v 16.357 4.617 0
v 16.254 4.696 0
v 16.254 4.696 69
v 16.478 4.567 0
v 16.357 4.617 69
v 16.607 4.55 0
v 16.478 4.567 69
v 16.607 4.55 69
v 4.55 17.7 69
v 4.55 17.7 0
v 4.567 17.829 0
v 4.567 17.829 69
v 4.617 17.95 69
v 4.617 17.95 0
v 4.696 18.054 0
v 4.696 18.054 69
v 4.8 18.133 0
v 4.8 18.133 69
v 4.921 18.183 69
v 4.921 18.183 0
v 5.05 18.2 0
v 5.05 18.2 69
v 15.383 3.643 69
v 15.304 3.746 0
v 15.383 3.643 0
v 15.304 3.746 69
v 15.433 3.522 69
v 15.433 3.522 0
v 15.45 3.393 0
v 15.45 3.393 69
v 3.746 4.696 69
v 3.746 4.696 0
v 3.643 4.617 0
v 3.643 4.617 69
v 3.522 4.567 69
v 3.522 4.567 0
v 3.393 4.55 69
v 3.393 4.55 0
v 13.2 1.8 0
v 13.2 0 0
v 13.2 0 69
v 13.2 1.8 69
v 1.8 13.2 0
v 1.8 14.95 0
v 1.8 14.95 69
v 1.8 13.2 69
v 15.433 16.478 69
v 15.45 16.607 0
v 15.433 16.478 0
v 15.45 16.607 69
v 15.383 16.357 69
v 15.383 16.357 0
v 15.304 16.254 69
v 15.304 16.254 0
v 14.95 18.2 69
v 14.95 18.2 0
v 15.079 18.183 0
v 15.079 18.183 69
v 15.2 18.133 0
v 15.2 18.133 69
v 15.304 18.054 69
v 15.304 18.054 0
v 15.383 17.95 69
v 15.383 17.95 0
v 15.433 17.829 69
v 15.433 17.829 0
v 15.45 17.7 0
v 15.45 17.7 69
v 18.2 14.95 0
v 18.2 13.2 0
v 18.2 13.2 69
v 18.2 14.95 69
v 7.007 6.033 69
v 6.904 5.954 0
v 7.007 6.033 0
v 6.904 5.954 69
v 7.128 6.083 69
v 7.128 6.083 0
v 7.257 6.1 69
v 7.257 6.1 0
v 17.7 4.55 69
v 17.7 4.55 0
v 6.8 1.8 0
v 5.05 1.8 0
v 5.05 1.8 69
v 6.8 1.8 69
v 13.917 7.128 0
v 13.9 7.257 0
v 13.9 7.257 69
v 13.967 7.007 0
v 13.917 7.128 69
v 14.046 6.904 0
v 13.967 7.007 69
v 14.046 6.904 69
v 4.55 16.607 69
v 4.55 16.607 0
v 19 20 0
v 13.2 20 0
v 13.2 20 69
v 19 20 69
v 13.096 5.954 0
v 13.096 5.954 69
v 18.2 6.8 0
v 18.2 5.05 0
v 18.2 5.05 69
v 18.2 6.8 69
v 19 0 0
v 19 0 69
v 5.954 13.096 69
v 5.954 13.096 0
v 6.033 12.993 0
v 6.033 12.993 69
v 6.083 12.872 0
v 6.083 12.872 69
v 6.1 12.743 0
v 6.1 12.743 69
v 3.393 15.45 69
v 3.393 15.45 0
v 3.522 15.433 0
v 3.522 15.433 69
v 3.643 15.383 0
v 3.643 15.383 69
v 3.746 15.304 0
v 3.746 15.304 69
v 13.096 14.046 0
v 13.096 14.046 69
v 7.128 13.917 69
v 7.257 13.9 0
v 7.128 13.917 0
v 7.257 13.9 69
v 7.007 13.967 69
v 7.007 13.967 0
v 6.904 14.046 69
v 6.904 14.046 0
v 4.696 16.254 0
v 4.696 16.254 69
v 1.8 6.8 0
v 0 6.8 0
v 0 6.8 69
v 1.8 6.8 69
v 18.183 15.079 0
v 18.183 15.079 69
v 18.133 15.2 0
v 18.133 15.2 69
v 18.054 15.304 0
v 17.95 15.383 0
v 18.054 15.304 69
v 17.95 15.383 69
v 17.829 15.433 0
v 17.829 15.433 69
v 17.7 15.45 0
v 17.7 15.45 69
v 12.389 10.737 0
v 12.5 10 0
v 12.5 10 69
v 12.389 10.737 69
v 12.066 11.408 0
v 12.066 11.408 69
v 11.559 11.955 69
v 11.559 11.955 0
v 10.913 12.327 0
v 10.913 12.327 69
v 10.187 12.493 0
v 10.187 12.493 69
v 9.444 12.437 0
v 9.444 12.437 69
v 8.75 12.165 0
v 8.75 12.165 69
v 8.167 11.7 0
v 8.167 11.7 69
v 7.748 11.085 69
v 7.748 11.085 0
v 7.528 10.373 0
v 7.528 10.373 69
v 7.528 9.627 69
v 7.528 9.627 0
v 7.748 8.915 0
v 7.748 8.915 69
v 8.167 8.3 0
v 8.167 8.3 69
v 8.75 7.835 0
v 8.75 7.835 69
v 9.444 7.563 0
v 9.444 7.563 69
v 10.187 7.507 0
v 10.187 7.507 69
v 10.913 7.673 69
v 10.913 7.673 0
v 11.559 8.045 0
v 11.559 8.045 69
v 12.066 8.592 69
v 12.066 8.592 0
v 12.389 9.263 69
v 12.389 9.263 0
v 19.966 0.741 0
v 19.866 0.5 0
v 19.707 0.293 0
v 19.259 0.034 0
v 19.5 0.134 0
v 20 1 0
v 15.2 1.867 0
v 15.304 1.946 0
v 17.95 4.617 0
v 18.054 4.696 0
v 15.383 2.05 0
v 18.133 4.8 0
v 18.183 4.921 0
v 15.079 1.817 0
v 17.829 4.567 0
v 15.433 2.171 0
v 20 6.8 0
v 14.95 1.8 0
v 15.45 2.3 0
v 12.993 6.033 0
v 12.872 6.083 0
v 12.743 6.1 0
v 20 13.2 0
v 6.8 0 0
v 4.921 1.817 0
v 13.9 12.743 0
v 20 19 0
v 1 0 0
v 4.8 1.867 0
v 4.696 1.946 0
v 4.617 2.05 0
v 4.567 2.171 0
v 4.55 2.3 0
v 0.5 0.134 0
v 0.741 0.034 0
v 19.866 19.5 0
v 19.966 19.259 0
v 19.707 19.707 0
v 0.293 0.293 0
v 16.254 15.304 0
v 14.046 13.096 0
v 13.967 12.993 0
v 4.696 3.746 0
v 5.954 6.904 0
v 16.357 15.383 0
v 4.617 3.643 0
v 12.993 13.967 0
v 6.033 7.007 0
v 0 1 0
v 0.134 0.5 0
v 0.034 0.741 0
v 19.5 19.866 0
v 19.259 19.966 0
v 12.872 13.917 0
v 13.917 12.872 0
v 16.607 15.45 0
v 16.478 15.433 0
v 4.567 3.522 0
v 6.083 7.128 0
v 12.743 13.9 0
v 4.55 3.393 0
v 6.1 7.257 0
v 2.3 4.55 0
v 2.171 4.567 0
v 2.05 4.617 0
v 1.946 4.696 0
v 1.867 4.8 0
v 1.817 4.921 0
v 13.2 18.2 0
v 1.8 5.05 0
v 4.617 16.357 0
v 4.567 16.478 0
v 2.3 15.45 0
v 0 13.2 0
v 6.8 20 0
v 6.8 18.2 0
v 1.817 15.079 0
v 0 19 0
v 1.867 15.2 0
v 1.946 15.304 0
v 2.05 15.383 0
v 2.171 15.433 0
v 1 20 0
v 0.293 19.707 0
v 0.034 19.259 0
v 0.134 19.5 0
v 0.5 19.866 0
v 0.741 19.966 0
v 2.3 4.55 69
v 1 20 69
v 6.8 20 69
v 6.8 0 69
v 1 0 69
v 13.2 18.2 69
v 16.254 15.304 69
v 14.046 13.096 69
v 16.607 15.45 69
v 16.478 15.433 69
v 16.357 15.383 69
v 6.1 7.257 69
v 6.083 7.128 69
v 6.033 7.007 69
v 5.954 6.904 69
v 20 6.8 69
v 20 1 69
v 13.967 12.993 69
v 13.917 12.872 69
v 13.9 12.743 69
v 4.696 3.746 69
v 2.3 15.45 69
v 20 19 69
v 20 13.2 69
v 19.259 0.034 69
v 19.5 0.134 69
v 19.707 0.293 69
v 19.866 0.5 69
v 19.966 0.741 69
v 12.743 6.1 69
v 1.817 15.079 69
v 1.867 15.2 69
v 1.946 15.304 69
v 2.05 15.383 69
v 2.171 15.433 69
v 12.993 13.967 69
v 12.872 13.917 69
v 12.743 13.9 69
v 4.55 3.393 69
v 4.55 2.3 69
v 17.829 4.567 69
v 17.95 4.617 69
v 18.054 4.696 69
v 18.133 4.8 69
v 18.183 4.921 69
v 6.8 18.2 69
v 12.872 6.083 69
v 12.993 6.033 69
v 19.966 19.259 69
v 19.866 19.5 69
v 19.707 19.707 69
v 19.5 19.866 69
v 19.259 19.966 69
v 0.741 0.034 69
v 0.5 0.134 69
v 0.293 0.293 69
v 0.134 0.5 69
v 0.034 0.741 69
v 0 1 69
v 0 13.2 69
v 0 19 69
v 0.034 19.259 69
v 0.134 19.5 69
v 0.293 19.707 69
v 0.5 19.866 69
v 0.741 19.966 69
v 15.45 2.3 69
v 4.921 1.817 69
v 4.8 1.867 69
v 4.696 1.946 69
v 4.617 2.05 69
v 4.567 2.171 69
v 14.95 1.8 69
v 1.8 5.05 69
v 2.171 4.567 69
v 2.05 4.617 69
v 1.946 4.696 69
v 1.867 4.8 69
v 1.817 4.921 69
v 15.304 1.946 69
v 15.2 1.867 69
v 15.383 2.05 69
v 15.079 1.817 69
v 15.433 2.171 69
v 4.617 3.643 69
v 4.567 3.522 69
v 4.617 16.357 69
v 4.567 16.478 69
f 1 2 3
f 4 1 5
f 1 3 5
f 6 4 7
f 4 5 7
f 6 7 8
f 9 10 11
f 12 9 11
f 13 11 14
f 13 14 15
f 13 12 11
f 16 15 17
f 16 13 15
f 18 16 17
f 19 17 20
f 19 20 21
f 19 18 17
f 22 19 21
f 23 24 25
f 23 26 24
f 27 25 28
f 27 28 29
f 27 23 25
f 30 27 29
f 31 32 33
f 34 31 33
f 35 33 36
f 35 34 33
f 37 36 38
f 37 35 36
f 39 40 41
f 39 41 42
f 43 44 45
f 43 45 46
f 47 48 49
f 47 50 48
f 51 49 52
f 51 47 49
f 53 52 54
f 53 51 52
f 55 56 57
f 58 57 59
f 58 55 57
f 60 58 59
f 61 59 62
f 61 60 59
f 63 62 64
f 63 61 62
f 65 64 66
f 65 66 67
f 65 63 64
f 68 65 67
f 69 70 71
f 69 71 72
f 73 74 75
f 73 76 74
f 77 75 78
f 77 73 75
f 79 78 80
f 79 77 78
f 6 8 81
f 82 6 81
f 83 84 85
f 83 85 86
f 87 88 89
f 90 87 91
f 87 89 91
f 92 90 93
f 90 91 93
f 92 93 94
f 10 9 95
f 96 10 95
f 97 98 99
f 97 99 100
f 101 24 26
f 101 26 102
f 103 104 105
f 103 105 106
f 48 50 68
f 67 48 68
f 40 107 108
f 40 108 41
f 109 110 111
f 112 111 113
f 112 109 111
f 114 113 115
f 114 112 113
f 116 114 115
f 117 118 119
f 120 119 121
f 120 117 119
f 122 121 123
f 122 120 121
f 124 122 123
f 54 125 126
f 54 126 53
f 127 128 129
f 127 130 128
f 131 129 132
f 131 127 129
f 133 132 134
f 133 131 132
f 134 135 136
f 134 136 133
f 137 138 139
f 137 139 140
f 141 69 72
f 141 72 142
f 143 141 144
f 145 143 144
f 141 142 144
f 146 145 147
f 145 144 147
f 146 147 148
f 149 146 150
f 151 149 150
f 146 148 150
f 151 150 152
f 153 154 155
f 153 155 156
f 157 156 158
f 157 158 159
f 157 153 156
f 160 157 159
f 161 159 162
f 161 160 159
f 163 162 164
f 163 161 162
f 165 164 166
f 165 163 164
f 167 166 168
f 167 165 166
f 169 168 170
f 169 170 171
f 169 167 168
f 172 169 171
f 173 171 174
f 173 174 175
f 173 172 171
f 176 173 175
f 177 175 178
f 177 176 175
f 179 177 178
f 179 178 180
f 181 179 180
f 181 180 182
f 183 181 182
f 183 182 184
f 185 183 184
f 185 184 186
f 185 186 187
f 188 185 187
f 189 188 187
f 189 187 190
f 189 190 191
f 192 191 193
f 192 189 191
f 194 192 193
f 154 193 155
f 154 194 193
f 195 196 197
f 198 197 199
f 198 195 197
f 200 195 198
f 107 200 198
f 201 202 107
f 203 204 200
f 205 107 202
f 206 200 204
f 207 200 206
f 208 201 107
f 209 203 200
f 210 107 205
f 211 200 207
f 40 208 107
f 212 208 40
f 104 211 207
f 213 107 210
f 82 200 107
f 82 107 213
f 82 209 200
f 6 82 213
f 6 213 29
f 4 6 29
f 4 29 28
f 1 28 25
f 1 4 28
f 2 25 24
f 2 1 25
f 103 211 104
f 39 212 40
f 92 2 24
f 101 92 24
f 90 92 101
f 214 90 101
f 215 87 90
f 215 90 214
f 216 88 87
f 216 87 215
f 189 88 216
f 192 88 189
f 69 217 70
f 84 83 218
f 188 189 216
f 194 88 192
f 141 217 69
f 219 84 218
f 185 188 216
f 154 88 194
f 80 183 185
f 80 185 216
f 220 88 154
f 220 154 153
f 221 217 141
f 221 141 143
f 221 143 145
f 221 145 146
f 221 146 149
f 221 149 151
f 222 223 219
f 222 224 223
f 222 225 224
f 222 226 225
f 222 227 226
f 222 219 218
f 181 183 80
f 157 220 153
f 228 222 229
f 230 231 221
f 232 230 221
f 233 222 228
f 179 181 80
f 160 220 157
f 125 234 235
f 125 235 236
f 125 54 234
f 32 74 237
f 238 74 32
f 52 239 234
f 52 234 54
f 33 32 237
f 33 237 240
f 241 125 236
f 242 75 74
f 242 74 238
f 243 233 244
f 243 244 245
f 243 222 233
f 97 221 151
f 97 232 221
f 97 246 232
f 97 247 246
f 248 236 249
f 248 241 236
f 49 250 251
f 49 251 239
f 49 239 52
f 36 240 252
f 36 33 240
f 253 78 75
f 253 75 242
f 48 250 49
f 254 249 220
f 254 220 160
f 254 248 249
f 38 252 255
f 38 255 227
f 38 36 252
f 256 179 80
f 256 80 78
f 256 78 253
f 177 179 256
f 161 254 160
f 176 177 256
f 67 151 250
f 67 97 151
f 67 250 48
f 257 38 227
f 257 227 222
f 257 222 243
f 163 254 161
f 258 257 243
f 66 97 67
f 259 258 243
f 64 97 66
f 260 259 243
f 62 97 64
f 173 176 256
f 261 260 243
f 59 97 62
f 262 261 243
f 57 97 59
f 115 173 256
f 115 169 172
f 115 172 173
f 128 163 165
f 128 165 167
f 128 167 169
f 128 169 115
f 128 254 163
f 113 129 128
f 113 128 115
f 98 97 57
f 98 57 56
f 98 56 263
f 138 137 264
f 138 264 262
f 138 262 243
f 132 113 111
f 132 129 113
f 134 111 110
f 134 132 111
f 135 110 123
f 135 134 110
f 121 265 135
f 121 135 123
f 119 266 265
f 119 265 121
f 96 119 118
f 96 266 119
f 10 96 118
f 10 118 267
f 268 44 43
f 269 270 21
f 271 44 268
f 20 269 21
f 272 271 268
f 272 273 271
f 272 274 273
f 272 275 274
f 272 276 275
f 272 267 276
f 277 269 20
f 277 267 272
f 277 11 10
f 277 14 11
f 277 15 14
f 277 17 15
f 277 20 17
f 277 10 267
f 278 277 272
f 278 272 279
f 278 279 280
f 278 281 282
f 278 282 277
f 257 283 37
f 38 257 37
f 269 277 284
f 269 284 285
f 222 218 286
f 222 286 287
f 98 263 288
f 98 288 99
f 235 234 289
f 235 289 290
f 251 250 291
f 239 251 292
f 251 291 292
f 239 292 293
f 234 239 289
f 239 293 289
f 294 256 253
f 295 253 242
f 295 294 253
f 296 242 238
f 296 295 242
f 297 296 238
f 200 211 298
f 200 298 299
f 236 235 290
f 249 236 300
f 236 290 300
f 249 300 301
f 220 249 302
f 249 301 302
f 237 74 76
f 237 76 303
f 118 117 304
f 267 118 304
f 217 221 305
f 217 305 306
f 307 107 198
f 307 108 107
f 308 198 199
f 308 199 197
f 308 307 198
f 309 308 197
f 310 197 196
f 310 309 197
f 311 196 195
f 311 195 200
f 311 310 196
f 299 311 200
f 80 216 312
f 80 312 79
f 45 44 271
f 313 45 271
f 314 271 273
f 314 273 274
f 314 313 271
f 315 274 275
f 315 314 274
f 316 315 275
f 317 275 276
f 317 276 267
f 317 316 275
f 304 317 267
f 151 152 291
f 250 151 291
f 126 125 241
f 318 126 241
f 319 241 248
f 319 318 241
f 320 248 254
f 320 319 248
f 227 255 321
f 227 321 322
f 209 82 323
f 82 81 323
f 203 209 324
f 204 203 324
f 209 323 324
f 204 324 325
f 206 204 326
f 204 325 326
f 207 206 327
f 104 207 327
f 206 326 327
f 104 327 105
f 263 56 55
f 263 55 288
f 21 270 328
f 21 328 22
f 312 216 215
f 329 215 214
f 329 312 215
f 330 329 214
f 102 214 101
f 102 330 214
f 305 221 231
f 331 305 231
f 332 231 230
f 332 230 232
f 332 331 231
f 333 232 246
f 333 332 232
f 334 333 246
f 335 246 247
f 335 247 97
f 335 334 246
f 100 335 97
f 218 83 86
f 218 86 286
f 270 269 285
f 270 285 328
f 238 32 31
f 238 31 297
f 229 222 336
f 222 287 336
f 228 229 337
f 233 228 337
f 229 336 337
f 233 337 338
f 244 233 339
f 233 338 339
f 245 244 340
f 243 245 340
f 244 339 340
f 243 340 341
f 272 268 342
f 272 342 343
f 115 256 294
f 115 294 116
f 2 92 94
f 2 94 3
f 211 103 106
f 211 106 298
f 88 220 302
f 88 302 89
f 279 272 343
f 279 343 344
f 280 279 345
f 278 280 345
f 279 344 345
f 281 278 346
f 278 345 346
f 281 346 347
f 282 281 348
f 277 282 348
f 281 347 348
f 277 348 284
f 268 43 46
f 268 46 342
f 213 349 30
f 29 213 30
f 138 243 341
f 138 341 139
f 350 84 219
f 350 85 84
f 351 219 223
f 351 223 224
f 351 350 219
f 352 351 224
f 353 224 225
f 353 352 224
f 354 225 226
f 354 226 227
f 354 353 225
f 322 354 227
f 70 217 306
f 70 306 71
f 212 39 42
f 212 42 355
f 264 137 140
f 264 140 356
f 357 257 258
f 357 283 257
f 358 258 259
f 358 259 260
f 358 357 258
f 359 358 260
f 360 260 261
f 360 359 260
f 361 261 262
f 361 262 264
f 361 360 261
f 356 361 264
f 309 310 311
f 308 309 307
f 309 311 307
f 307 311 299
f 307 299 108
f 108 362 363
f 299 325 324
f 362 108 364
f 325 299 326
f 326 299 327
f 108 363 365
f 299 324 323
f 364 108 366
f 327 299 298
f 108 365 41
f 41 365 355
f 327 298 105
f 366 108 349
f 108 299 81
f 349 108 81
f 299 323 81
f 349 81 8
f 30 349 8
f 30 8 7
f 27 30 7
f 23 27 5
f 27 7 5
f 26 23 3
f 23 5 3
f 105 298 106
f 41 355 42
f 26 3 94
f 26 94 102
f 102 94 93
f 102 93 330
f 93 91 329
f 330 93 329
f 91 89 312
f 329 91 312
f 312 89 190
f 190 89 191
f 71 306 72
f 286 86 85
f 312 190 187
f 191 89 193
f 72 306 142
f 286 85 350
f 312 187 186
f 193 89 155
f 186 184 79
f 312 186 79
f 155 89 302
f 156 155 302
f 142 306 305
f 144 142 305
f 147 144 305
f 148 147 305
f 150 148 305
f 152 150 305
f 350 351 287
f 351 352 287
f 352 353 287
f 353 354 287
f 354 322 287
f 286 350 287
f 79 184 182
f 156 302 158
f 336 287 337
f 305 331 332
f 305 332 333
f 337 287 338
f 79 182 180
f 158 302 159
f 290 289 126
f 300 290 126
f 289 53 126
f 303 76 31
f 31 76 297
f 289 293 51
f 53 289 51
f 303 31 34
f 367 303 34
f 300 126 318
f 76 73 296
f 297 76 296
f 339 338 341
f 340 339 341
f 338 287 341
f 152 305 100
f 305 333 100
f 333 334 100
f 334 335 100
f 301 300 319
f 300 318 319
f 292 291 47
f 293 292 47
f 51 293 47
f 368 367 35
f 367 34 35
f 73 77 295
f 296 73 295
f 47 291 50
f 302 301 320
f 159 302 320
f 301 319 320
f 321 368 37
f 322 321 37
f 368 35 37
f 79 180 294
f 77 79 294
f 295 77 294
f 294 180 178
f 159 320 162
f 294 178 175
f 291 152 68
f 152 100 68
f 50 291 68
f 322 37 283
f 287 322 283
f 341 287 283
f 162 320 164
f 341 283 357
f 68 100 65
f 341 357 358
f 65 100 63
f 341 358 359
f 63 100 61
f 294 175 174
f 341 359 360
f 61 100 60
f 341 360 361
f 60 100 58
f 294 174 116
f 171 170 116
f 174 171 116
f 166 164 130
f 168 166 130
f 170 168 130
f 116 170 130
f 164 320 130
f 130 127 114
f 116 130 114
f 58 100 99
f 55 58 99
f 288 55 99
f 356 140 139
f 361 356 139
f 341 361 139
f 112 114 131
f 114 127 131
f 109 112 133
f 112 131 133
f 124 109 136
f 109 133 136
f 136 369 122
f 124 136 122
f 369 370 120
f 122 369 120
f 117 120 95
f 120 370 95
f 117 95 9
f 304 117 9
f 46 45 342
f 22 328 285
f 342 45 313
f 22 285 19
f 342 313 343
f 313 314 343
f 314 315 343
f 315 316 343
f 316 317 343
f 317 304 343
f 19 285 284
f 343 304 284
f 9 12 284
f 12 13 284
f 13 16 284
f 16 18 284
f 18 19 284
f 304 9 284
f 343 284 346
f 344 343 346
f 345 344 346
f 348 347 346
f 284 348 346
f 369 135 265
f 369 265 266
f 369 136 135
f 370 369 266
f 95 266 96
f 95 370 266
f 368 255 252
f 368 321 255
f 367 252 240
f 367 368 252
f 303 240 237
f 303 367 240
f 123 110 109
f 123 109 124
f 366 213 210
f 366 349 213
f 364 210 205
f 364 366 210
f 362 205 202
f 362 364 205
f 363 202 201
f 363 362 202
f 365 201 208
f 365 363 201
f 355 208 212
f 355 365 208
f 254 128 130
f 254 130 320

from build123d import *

# Parameters (mm, degrees)
SKETCH1_R           = 2.5
BOSS_EXTRUDE1_DEPTH = 69
FILLET1_R           = 1
FILLET2_R           = 0.5
FILLET3_R           = 0.5
FILLET4_R           = 0.5
FILLET5_R           = 0.5


with BuildPart() as part:
    # Sketch1 → Boss-Extrude1 (new body)
    with BuildSketch(Plane.XY):
        Polygon((13.2, 0), (13.2, 1.8), (15.45, 1.8), (15.45, 3.6), (12.95, 6.1), (7.05, 6.1), (4.55, 3.6), (4.55, 1.8), (6.8, 1.8), (6.8, 0), (0, 0), (0, 6.8), (1.8, 6.8), (1.8, 4.55), (3.6, 4.55), (6.1, 7.05), (6.1, 12.95), (3.6, 15.45), (1.8, 15.45), (1.8, 13.2), (0, 13.2), (0, 20), (6.8, 20), (6.8, 18.2), (4.55, 18.2), (4.55, 16.4), (7.05, 13.9), (12.95, 13.9), (15.45, 16.4), (15.45, 18.2), (13.2, 18.2), (13.2, 20), (20, 20), (20, 13.2), (18.2, 13.2), (18.2, 15.45), (16.4, 15.45), (13.9, 12.95), (13.9, 7.05), (16.4, 4.55), (18.2, 4.55), (18.2, 6.8), (20, 6.8), (20, 0), align=None)
        with Locations((10, 10)):
            Circle(SKETCH1_R, mode=Mode.SUBTRACT)
    extrude(amount=BOSS_EXTRUDE1_DEPTH)

    # Fillet1
    fillet1_edges = [part.edges().sort_by_distance(p)[0] for p in [
        (0, 0, 34.5),
        (0, 20, 34.5),
        (20, 20, 34.5),
        (20, 0, 34.5),
    ]]
    fillet(fillet1_edges, radius=FILLET1_R)

    # Fillet2
    fillet2_edges = [part.edges().sort_by_distance(p)[0] for p in [
        (4.55, 18.2, 34.5),
        (4.55, 16.4, 34.5),
        (7.05, 13.9, 34.5),
        (12.95, 13.9, 34.5),
        (15.45, 16.4, 34.5),
        (15.45, 18.2, 34.5),
    ]]
    fillet(fillet2_edges, radius=FILLET2_R)

    # Fillet3
    fillet3_edges = [part.edges().sort_by_distance(p)[0] for p in [
        (18.2, 15.45, 34.5),
        (16.4, 15.45, 34.5),
        (13.9, 12.95, 34.5),
        (13.9, 7.05, 34.5),
        (16.4, 4.55, 34.5),
        (18.2, 4.55, 34.5),
    ]]
    fillet(fillet3_edges, radius=FILLET3_R)

    # Fillet4
    fillet4_edges = [part.edges().sort_by_distance(p)[0] for p in [
        (1.8, 4.55, 34.5),
        (3.6, 4.55, 34.5),
        (6.1, 7.05, 34.5),
        (6.1, 12.95, 34.5),
        (3.6, 15.45, 34.5),
        (1.8, 15.45, 34.5),
    ]]
    fillet(fillet4_edges, radius=FILLET4_R)

    # Fillet5
    fillet5_edges = [part.edges().sort_by_distance(p)[0] for p in [
        (15.45, 1.8, 34.5),
        (15.45, 3.6, 34.5),
        (12.95, 6.1, 34.5),
        (7.05, 6.1, 34.5),
        (4.55, 3.6, 34.5),
        (4.55, 1.8, 34.5),
    ]]
    fillet(fillet5_edges, radius=FILLET5_R)


solid = part.part
